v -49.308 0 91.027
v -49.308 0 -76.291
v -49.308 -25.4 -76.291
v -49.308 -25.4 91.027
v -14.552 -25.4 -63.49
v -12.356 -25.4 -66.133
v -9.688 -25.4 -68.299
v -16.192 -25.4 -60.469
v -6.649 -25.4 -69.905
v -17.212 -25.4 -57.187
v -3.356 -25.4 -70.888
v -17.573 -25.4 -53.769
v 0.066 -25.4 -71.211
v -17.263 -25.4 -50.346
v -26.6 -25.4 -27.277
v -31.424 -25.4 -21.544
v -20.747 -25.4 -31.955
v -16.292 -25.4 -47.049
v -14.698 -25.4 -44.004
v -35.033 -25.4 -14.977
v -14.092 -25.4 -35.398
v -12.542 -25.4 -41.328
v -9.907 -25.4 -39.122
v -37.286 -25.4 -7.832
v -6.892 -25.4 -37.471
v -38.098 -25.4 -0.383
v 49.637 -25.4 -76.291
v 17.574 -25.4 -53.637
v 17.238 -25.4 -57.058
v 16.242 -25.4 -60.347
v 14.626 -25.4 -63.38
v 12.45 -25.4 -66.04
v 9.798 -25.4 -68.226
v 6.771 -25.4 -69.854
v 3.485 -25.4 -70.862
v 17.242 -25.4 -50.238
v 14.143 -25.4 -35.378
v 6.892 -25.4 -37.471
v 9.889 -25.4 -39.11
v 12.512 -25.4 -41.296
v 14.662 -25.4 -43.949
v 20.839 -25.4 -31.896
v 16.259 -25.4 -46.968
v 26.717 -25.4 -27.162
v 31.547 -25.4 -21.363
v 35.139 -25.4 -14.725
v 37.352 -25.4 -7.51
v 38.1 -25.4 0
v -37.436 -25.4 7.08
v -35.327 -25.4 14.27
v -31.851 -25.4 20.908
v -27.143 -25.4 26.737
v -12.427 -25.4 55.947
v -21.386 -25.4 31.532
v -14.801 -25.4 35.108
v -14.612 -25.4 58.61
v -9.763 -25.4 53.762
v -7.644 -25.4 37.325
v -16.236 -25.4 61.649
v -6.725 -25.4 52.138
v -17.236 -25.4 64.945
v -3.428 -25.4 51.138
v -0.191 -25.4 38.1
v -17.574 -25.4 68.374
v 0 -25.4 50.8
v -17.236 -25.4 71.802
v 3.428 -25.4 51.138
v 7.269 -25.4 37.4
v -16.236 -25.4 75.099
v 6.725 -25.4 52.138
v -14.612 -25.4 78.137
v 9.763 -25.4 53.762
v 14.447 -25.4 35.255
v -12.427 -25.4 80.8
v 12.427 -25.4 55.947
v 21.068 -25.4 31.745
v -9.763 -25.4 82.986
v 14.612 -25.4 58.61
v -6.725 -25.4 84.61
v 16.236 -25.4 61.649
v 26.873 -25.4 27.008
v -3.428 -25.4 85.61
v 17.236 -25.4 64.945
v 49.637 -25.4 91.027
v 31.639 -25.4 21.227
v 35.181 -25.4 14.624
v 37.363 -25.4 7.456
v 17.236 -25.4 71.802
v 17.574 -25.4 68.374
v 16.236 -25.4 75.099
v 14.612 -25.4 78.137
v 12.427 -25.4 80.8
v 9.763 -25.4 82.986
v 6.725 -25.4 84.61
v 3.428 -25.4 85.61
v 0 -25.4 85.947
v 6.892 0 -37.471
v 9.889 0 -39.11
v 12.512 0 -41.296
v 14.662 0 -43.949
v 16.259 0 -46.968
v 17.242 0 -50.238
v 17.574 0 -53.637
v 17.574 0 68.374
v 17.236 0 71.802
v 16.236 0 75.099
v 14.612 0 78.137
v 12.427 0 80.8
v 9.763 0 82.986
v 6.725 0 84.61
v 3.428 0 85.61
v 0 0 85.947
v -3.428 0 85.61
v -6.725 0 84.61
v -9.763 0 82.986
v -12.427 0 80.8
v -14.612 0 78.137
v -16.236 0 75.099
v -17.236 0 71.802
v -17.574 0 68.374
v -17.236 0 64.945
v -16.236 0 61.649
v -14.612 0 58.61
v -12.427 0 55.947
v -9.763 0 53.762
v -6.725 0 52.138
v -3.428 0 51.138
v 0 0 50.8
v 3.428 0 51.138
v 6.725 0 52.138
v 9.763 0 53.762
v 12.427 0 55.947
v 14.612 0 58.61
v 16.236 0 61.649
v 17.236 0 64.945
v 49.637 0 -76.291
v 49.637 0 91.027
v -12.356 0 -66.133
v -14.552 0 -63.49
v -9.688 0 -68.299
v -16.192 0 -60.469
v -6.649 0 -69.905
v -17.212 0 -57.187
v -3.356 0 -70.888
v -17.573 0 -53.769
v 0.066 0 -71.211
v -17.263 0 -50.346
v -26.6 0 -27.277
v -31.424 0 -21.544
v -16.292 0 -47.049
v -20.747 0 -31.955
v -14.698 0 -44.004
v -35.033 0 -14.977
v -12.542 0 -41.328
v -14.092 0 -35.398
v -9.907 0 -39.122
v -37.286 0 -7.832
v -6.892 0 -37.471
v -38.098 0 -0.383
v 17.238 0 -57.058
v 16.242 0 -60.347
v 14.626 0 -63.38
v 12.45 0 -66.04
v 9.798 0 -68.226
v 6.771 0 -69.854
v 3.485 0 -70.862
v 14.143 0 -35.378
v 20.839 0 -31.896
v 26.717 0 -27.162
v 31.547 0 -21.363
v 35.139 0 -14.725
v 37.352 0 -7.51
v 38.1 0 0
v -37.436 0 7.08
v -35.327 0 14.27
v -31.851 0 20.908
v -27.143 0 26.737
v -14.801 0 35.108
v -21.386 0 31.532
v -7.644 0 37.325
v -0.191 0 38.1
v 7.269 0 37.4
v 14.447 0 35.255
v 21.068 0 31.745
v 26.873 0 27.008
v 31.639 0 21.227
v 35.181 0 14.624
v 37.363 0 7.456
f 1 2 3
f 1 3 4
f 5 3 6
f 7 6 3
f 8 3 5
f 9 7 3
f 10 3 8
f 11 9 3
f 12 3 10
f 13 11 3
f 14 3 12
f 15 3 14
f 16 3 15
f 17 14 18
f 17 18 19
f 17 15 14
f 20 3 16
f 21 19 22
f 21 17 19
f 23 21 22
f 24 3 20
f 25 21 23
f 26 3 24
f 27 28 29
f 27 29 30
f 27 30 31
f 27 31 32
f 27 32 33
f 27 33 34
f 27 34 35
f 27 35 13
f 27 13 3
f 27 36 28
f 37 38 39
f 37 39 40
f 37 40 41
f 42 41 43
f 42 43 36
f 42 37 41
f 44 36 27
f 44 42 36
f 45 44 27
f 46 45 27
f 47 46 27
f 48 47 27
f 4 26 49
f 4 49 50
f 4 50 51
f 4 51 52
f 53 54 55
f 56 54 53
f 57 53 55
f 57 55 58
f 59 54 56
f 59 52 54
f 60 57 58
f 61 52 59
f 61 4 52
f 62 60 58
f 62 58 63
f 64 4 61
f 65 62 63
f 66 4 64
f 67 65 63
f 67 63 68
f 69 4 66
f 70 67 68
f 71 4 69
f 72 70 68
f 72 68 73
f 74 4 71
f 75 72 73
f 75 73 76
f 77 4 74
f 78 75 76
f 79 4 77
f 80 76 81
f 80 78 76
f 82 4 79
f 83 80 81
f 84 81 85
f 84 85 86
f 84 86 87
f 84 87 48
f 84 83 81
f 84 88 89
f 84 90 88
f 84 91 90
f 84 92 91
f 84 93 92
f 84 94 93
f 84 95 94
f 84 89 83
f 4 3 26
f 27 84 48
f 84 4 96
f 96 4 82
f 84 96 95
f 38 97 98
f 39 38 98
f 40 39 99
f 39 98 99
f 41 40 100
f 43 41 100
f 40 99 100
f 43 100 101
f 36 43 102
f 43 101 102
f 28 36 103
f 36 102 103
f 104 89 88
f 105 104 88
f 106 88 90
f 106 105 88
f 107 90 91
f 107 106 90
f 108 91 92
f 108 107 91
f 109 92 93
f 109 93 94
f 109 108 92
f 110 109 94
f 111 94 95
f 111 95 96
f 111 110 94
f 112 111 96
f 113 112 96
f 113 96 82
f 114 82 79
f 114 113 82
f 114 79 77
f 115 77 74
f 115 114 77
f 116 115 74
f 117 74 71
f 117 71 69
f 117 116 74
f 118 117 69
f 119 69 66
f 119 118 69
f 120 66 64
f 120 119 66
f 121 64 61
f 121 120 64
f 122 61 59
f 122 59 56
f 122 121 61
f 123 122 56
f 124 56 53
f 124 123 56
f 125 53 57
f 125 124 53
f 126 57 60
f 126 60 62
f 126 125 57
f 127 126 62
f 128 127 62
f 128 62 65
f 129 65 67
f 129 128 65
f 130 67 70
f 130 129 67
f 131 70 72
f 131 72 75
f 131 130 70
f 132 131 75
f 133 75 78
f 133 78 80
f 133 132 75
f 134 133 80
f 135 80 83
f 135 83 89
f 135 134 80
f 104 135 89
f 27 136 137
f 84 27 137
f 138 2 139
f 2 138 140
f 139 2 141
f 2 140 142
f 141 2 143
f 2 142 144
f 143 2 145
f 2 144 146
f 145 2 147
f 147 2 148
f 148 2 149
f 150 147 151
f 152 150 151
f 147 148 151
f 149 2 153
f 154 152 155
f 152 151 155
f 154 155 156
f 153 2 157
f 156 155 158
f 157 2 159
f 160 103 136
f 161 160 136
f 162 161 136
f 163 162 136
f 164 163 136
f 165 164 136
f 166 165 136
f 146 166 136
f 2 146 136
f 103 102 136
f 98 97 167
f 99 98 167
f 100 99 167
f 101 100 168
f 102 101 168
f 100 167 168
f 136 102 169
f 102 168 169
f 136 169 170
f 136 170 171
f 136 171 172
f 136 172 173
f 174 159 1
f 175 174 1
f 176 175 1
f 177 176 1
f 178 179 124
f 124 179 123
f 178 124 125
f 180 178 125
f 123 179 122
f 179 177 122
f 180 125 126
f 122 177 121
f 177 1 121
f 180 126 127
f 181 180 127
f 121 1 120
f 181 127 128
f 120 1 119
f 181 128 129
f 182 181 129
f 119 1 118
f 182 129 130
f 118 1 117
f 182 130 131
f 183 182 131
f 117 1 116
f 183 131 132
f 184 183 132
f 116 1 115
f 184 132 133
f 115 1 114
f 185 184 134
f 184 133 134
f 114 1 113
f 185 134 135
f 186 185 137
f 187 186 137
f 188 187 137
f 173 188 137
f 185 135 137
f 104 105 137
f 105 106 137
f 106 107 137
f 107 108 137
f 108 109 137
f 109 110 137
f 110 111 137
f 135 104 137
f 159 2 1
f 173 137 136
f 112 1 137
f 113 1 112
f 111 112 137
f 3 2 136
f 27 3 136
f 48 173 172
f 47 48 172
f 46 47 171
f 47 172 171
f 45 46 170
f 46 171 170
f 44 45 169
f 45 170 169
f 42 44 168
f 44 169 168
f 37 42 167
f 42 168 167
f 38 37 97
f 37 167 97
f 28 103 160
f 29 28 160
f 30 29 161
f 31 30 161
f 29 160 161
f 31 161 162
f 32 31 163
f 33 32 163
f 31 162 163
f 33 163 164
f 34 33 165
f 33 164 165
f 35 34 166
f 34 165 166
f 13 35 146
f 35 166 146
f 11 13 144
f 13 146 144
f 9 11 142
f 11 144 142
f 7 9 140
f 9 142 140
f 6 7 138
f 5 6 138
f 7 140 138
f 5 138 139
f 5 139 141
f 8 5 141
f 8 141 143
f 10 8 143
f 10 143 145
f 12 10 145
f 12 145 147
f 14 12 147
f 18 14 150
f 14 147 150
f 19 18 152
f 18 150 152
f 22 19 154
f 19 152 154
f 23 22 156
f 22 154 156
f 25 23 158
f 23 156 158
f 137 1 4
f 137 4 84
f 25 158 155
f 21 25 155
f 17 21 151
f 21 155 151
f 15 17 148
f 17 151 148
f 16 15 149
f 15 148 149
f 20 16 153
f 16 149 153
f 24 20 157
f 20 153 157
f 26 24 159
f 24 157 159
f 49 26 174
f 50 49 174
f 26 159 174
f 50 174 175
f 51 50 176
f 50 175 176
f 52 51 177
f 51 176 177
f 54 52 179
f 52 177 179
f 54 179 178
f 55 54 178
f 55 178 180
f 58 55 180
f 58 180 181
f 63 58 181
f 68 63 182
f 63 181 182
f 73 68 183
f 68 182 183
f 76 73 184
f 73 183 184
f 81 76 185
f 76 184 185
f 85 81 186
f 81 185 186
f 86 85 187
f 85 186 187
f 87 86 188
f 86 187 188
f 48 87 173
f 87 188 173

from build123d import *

# Parameters (mm, degrees)
F0_W     = 98.944682
F0_H     = 167.318415
F0_R     = 17.573737
F1_DEPTH = 25.4


with BuildPart() as f1:
    # F0 (on Front) → F1 (new body)
    with BuildSketch(Plane.XZ):
        with Locations((0.164358, 7.368268)):
            Rectangle(F0_W, F0_H)
        with BuildLine():
            ThreePointArc((-6.892271, -37.47141), (-24.382519, 29.276318), (38.1, 0))
            ThreePointArc((38.1, 0), (29.276318, -24.382519), (6.892271, -37.47141))
            ThreePointArc((6.892271, -37.47141), (14.662183, -43.949239), (17.573737, -53.637203))
            ThreePointArc((17.573737, -53.637203), (-9.687964, -68.299385), (-6.892271, -37.47141))
        make_face(mode=Mode.SUBTRACT)
        with Locations((0, 68.373737)):
            Circle(F0_R, mode=Mode.SUBTRACT)
    extrude(amount=F1_DEPTH)


solid = f1.part
